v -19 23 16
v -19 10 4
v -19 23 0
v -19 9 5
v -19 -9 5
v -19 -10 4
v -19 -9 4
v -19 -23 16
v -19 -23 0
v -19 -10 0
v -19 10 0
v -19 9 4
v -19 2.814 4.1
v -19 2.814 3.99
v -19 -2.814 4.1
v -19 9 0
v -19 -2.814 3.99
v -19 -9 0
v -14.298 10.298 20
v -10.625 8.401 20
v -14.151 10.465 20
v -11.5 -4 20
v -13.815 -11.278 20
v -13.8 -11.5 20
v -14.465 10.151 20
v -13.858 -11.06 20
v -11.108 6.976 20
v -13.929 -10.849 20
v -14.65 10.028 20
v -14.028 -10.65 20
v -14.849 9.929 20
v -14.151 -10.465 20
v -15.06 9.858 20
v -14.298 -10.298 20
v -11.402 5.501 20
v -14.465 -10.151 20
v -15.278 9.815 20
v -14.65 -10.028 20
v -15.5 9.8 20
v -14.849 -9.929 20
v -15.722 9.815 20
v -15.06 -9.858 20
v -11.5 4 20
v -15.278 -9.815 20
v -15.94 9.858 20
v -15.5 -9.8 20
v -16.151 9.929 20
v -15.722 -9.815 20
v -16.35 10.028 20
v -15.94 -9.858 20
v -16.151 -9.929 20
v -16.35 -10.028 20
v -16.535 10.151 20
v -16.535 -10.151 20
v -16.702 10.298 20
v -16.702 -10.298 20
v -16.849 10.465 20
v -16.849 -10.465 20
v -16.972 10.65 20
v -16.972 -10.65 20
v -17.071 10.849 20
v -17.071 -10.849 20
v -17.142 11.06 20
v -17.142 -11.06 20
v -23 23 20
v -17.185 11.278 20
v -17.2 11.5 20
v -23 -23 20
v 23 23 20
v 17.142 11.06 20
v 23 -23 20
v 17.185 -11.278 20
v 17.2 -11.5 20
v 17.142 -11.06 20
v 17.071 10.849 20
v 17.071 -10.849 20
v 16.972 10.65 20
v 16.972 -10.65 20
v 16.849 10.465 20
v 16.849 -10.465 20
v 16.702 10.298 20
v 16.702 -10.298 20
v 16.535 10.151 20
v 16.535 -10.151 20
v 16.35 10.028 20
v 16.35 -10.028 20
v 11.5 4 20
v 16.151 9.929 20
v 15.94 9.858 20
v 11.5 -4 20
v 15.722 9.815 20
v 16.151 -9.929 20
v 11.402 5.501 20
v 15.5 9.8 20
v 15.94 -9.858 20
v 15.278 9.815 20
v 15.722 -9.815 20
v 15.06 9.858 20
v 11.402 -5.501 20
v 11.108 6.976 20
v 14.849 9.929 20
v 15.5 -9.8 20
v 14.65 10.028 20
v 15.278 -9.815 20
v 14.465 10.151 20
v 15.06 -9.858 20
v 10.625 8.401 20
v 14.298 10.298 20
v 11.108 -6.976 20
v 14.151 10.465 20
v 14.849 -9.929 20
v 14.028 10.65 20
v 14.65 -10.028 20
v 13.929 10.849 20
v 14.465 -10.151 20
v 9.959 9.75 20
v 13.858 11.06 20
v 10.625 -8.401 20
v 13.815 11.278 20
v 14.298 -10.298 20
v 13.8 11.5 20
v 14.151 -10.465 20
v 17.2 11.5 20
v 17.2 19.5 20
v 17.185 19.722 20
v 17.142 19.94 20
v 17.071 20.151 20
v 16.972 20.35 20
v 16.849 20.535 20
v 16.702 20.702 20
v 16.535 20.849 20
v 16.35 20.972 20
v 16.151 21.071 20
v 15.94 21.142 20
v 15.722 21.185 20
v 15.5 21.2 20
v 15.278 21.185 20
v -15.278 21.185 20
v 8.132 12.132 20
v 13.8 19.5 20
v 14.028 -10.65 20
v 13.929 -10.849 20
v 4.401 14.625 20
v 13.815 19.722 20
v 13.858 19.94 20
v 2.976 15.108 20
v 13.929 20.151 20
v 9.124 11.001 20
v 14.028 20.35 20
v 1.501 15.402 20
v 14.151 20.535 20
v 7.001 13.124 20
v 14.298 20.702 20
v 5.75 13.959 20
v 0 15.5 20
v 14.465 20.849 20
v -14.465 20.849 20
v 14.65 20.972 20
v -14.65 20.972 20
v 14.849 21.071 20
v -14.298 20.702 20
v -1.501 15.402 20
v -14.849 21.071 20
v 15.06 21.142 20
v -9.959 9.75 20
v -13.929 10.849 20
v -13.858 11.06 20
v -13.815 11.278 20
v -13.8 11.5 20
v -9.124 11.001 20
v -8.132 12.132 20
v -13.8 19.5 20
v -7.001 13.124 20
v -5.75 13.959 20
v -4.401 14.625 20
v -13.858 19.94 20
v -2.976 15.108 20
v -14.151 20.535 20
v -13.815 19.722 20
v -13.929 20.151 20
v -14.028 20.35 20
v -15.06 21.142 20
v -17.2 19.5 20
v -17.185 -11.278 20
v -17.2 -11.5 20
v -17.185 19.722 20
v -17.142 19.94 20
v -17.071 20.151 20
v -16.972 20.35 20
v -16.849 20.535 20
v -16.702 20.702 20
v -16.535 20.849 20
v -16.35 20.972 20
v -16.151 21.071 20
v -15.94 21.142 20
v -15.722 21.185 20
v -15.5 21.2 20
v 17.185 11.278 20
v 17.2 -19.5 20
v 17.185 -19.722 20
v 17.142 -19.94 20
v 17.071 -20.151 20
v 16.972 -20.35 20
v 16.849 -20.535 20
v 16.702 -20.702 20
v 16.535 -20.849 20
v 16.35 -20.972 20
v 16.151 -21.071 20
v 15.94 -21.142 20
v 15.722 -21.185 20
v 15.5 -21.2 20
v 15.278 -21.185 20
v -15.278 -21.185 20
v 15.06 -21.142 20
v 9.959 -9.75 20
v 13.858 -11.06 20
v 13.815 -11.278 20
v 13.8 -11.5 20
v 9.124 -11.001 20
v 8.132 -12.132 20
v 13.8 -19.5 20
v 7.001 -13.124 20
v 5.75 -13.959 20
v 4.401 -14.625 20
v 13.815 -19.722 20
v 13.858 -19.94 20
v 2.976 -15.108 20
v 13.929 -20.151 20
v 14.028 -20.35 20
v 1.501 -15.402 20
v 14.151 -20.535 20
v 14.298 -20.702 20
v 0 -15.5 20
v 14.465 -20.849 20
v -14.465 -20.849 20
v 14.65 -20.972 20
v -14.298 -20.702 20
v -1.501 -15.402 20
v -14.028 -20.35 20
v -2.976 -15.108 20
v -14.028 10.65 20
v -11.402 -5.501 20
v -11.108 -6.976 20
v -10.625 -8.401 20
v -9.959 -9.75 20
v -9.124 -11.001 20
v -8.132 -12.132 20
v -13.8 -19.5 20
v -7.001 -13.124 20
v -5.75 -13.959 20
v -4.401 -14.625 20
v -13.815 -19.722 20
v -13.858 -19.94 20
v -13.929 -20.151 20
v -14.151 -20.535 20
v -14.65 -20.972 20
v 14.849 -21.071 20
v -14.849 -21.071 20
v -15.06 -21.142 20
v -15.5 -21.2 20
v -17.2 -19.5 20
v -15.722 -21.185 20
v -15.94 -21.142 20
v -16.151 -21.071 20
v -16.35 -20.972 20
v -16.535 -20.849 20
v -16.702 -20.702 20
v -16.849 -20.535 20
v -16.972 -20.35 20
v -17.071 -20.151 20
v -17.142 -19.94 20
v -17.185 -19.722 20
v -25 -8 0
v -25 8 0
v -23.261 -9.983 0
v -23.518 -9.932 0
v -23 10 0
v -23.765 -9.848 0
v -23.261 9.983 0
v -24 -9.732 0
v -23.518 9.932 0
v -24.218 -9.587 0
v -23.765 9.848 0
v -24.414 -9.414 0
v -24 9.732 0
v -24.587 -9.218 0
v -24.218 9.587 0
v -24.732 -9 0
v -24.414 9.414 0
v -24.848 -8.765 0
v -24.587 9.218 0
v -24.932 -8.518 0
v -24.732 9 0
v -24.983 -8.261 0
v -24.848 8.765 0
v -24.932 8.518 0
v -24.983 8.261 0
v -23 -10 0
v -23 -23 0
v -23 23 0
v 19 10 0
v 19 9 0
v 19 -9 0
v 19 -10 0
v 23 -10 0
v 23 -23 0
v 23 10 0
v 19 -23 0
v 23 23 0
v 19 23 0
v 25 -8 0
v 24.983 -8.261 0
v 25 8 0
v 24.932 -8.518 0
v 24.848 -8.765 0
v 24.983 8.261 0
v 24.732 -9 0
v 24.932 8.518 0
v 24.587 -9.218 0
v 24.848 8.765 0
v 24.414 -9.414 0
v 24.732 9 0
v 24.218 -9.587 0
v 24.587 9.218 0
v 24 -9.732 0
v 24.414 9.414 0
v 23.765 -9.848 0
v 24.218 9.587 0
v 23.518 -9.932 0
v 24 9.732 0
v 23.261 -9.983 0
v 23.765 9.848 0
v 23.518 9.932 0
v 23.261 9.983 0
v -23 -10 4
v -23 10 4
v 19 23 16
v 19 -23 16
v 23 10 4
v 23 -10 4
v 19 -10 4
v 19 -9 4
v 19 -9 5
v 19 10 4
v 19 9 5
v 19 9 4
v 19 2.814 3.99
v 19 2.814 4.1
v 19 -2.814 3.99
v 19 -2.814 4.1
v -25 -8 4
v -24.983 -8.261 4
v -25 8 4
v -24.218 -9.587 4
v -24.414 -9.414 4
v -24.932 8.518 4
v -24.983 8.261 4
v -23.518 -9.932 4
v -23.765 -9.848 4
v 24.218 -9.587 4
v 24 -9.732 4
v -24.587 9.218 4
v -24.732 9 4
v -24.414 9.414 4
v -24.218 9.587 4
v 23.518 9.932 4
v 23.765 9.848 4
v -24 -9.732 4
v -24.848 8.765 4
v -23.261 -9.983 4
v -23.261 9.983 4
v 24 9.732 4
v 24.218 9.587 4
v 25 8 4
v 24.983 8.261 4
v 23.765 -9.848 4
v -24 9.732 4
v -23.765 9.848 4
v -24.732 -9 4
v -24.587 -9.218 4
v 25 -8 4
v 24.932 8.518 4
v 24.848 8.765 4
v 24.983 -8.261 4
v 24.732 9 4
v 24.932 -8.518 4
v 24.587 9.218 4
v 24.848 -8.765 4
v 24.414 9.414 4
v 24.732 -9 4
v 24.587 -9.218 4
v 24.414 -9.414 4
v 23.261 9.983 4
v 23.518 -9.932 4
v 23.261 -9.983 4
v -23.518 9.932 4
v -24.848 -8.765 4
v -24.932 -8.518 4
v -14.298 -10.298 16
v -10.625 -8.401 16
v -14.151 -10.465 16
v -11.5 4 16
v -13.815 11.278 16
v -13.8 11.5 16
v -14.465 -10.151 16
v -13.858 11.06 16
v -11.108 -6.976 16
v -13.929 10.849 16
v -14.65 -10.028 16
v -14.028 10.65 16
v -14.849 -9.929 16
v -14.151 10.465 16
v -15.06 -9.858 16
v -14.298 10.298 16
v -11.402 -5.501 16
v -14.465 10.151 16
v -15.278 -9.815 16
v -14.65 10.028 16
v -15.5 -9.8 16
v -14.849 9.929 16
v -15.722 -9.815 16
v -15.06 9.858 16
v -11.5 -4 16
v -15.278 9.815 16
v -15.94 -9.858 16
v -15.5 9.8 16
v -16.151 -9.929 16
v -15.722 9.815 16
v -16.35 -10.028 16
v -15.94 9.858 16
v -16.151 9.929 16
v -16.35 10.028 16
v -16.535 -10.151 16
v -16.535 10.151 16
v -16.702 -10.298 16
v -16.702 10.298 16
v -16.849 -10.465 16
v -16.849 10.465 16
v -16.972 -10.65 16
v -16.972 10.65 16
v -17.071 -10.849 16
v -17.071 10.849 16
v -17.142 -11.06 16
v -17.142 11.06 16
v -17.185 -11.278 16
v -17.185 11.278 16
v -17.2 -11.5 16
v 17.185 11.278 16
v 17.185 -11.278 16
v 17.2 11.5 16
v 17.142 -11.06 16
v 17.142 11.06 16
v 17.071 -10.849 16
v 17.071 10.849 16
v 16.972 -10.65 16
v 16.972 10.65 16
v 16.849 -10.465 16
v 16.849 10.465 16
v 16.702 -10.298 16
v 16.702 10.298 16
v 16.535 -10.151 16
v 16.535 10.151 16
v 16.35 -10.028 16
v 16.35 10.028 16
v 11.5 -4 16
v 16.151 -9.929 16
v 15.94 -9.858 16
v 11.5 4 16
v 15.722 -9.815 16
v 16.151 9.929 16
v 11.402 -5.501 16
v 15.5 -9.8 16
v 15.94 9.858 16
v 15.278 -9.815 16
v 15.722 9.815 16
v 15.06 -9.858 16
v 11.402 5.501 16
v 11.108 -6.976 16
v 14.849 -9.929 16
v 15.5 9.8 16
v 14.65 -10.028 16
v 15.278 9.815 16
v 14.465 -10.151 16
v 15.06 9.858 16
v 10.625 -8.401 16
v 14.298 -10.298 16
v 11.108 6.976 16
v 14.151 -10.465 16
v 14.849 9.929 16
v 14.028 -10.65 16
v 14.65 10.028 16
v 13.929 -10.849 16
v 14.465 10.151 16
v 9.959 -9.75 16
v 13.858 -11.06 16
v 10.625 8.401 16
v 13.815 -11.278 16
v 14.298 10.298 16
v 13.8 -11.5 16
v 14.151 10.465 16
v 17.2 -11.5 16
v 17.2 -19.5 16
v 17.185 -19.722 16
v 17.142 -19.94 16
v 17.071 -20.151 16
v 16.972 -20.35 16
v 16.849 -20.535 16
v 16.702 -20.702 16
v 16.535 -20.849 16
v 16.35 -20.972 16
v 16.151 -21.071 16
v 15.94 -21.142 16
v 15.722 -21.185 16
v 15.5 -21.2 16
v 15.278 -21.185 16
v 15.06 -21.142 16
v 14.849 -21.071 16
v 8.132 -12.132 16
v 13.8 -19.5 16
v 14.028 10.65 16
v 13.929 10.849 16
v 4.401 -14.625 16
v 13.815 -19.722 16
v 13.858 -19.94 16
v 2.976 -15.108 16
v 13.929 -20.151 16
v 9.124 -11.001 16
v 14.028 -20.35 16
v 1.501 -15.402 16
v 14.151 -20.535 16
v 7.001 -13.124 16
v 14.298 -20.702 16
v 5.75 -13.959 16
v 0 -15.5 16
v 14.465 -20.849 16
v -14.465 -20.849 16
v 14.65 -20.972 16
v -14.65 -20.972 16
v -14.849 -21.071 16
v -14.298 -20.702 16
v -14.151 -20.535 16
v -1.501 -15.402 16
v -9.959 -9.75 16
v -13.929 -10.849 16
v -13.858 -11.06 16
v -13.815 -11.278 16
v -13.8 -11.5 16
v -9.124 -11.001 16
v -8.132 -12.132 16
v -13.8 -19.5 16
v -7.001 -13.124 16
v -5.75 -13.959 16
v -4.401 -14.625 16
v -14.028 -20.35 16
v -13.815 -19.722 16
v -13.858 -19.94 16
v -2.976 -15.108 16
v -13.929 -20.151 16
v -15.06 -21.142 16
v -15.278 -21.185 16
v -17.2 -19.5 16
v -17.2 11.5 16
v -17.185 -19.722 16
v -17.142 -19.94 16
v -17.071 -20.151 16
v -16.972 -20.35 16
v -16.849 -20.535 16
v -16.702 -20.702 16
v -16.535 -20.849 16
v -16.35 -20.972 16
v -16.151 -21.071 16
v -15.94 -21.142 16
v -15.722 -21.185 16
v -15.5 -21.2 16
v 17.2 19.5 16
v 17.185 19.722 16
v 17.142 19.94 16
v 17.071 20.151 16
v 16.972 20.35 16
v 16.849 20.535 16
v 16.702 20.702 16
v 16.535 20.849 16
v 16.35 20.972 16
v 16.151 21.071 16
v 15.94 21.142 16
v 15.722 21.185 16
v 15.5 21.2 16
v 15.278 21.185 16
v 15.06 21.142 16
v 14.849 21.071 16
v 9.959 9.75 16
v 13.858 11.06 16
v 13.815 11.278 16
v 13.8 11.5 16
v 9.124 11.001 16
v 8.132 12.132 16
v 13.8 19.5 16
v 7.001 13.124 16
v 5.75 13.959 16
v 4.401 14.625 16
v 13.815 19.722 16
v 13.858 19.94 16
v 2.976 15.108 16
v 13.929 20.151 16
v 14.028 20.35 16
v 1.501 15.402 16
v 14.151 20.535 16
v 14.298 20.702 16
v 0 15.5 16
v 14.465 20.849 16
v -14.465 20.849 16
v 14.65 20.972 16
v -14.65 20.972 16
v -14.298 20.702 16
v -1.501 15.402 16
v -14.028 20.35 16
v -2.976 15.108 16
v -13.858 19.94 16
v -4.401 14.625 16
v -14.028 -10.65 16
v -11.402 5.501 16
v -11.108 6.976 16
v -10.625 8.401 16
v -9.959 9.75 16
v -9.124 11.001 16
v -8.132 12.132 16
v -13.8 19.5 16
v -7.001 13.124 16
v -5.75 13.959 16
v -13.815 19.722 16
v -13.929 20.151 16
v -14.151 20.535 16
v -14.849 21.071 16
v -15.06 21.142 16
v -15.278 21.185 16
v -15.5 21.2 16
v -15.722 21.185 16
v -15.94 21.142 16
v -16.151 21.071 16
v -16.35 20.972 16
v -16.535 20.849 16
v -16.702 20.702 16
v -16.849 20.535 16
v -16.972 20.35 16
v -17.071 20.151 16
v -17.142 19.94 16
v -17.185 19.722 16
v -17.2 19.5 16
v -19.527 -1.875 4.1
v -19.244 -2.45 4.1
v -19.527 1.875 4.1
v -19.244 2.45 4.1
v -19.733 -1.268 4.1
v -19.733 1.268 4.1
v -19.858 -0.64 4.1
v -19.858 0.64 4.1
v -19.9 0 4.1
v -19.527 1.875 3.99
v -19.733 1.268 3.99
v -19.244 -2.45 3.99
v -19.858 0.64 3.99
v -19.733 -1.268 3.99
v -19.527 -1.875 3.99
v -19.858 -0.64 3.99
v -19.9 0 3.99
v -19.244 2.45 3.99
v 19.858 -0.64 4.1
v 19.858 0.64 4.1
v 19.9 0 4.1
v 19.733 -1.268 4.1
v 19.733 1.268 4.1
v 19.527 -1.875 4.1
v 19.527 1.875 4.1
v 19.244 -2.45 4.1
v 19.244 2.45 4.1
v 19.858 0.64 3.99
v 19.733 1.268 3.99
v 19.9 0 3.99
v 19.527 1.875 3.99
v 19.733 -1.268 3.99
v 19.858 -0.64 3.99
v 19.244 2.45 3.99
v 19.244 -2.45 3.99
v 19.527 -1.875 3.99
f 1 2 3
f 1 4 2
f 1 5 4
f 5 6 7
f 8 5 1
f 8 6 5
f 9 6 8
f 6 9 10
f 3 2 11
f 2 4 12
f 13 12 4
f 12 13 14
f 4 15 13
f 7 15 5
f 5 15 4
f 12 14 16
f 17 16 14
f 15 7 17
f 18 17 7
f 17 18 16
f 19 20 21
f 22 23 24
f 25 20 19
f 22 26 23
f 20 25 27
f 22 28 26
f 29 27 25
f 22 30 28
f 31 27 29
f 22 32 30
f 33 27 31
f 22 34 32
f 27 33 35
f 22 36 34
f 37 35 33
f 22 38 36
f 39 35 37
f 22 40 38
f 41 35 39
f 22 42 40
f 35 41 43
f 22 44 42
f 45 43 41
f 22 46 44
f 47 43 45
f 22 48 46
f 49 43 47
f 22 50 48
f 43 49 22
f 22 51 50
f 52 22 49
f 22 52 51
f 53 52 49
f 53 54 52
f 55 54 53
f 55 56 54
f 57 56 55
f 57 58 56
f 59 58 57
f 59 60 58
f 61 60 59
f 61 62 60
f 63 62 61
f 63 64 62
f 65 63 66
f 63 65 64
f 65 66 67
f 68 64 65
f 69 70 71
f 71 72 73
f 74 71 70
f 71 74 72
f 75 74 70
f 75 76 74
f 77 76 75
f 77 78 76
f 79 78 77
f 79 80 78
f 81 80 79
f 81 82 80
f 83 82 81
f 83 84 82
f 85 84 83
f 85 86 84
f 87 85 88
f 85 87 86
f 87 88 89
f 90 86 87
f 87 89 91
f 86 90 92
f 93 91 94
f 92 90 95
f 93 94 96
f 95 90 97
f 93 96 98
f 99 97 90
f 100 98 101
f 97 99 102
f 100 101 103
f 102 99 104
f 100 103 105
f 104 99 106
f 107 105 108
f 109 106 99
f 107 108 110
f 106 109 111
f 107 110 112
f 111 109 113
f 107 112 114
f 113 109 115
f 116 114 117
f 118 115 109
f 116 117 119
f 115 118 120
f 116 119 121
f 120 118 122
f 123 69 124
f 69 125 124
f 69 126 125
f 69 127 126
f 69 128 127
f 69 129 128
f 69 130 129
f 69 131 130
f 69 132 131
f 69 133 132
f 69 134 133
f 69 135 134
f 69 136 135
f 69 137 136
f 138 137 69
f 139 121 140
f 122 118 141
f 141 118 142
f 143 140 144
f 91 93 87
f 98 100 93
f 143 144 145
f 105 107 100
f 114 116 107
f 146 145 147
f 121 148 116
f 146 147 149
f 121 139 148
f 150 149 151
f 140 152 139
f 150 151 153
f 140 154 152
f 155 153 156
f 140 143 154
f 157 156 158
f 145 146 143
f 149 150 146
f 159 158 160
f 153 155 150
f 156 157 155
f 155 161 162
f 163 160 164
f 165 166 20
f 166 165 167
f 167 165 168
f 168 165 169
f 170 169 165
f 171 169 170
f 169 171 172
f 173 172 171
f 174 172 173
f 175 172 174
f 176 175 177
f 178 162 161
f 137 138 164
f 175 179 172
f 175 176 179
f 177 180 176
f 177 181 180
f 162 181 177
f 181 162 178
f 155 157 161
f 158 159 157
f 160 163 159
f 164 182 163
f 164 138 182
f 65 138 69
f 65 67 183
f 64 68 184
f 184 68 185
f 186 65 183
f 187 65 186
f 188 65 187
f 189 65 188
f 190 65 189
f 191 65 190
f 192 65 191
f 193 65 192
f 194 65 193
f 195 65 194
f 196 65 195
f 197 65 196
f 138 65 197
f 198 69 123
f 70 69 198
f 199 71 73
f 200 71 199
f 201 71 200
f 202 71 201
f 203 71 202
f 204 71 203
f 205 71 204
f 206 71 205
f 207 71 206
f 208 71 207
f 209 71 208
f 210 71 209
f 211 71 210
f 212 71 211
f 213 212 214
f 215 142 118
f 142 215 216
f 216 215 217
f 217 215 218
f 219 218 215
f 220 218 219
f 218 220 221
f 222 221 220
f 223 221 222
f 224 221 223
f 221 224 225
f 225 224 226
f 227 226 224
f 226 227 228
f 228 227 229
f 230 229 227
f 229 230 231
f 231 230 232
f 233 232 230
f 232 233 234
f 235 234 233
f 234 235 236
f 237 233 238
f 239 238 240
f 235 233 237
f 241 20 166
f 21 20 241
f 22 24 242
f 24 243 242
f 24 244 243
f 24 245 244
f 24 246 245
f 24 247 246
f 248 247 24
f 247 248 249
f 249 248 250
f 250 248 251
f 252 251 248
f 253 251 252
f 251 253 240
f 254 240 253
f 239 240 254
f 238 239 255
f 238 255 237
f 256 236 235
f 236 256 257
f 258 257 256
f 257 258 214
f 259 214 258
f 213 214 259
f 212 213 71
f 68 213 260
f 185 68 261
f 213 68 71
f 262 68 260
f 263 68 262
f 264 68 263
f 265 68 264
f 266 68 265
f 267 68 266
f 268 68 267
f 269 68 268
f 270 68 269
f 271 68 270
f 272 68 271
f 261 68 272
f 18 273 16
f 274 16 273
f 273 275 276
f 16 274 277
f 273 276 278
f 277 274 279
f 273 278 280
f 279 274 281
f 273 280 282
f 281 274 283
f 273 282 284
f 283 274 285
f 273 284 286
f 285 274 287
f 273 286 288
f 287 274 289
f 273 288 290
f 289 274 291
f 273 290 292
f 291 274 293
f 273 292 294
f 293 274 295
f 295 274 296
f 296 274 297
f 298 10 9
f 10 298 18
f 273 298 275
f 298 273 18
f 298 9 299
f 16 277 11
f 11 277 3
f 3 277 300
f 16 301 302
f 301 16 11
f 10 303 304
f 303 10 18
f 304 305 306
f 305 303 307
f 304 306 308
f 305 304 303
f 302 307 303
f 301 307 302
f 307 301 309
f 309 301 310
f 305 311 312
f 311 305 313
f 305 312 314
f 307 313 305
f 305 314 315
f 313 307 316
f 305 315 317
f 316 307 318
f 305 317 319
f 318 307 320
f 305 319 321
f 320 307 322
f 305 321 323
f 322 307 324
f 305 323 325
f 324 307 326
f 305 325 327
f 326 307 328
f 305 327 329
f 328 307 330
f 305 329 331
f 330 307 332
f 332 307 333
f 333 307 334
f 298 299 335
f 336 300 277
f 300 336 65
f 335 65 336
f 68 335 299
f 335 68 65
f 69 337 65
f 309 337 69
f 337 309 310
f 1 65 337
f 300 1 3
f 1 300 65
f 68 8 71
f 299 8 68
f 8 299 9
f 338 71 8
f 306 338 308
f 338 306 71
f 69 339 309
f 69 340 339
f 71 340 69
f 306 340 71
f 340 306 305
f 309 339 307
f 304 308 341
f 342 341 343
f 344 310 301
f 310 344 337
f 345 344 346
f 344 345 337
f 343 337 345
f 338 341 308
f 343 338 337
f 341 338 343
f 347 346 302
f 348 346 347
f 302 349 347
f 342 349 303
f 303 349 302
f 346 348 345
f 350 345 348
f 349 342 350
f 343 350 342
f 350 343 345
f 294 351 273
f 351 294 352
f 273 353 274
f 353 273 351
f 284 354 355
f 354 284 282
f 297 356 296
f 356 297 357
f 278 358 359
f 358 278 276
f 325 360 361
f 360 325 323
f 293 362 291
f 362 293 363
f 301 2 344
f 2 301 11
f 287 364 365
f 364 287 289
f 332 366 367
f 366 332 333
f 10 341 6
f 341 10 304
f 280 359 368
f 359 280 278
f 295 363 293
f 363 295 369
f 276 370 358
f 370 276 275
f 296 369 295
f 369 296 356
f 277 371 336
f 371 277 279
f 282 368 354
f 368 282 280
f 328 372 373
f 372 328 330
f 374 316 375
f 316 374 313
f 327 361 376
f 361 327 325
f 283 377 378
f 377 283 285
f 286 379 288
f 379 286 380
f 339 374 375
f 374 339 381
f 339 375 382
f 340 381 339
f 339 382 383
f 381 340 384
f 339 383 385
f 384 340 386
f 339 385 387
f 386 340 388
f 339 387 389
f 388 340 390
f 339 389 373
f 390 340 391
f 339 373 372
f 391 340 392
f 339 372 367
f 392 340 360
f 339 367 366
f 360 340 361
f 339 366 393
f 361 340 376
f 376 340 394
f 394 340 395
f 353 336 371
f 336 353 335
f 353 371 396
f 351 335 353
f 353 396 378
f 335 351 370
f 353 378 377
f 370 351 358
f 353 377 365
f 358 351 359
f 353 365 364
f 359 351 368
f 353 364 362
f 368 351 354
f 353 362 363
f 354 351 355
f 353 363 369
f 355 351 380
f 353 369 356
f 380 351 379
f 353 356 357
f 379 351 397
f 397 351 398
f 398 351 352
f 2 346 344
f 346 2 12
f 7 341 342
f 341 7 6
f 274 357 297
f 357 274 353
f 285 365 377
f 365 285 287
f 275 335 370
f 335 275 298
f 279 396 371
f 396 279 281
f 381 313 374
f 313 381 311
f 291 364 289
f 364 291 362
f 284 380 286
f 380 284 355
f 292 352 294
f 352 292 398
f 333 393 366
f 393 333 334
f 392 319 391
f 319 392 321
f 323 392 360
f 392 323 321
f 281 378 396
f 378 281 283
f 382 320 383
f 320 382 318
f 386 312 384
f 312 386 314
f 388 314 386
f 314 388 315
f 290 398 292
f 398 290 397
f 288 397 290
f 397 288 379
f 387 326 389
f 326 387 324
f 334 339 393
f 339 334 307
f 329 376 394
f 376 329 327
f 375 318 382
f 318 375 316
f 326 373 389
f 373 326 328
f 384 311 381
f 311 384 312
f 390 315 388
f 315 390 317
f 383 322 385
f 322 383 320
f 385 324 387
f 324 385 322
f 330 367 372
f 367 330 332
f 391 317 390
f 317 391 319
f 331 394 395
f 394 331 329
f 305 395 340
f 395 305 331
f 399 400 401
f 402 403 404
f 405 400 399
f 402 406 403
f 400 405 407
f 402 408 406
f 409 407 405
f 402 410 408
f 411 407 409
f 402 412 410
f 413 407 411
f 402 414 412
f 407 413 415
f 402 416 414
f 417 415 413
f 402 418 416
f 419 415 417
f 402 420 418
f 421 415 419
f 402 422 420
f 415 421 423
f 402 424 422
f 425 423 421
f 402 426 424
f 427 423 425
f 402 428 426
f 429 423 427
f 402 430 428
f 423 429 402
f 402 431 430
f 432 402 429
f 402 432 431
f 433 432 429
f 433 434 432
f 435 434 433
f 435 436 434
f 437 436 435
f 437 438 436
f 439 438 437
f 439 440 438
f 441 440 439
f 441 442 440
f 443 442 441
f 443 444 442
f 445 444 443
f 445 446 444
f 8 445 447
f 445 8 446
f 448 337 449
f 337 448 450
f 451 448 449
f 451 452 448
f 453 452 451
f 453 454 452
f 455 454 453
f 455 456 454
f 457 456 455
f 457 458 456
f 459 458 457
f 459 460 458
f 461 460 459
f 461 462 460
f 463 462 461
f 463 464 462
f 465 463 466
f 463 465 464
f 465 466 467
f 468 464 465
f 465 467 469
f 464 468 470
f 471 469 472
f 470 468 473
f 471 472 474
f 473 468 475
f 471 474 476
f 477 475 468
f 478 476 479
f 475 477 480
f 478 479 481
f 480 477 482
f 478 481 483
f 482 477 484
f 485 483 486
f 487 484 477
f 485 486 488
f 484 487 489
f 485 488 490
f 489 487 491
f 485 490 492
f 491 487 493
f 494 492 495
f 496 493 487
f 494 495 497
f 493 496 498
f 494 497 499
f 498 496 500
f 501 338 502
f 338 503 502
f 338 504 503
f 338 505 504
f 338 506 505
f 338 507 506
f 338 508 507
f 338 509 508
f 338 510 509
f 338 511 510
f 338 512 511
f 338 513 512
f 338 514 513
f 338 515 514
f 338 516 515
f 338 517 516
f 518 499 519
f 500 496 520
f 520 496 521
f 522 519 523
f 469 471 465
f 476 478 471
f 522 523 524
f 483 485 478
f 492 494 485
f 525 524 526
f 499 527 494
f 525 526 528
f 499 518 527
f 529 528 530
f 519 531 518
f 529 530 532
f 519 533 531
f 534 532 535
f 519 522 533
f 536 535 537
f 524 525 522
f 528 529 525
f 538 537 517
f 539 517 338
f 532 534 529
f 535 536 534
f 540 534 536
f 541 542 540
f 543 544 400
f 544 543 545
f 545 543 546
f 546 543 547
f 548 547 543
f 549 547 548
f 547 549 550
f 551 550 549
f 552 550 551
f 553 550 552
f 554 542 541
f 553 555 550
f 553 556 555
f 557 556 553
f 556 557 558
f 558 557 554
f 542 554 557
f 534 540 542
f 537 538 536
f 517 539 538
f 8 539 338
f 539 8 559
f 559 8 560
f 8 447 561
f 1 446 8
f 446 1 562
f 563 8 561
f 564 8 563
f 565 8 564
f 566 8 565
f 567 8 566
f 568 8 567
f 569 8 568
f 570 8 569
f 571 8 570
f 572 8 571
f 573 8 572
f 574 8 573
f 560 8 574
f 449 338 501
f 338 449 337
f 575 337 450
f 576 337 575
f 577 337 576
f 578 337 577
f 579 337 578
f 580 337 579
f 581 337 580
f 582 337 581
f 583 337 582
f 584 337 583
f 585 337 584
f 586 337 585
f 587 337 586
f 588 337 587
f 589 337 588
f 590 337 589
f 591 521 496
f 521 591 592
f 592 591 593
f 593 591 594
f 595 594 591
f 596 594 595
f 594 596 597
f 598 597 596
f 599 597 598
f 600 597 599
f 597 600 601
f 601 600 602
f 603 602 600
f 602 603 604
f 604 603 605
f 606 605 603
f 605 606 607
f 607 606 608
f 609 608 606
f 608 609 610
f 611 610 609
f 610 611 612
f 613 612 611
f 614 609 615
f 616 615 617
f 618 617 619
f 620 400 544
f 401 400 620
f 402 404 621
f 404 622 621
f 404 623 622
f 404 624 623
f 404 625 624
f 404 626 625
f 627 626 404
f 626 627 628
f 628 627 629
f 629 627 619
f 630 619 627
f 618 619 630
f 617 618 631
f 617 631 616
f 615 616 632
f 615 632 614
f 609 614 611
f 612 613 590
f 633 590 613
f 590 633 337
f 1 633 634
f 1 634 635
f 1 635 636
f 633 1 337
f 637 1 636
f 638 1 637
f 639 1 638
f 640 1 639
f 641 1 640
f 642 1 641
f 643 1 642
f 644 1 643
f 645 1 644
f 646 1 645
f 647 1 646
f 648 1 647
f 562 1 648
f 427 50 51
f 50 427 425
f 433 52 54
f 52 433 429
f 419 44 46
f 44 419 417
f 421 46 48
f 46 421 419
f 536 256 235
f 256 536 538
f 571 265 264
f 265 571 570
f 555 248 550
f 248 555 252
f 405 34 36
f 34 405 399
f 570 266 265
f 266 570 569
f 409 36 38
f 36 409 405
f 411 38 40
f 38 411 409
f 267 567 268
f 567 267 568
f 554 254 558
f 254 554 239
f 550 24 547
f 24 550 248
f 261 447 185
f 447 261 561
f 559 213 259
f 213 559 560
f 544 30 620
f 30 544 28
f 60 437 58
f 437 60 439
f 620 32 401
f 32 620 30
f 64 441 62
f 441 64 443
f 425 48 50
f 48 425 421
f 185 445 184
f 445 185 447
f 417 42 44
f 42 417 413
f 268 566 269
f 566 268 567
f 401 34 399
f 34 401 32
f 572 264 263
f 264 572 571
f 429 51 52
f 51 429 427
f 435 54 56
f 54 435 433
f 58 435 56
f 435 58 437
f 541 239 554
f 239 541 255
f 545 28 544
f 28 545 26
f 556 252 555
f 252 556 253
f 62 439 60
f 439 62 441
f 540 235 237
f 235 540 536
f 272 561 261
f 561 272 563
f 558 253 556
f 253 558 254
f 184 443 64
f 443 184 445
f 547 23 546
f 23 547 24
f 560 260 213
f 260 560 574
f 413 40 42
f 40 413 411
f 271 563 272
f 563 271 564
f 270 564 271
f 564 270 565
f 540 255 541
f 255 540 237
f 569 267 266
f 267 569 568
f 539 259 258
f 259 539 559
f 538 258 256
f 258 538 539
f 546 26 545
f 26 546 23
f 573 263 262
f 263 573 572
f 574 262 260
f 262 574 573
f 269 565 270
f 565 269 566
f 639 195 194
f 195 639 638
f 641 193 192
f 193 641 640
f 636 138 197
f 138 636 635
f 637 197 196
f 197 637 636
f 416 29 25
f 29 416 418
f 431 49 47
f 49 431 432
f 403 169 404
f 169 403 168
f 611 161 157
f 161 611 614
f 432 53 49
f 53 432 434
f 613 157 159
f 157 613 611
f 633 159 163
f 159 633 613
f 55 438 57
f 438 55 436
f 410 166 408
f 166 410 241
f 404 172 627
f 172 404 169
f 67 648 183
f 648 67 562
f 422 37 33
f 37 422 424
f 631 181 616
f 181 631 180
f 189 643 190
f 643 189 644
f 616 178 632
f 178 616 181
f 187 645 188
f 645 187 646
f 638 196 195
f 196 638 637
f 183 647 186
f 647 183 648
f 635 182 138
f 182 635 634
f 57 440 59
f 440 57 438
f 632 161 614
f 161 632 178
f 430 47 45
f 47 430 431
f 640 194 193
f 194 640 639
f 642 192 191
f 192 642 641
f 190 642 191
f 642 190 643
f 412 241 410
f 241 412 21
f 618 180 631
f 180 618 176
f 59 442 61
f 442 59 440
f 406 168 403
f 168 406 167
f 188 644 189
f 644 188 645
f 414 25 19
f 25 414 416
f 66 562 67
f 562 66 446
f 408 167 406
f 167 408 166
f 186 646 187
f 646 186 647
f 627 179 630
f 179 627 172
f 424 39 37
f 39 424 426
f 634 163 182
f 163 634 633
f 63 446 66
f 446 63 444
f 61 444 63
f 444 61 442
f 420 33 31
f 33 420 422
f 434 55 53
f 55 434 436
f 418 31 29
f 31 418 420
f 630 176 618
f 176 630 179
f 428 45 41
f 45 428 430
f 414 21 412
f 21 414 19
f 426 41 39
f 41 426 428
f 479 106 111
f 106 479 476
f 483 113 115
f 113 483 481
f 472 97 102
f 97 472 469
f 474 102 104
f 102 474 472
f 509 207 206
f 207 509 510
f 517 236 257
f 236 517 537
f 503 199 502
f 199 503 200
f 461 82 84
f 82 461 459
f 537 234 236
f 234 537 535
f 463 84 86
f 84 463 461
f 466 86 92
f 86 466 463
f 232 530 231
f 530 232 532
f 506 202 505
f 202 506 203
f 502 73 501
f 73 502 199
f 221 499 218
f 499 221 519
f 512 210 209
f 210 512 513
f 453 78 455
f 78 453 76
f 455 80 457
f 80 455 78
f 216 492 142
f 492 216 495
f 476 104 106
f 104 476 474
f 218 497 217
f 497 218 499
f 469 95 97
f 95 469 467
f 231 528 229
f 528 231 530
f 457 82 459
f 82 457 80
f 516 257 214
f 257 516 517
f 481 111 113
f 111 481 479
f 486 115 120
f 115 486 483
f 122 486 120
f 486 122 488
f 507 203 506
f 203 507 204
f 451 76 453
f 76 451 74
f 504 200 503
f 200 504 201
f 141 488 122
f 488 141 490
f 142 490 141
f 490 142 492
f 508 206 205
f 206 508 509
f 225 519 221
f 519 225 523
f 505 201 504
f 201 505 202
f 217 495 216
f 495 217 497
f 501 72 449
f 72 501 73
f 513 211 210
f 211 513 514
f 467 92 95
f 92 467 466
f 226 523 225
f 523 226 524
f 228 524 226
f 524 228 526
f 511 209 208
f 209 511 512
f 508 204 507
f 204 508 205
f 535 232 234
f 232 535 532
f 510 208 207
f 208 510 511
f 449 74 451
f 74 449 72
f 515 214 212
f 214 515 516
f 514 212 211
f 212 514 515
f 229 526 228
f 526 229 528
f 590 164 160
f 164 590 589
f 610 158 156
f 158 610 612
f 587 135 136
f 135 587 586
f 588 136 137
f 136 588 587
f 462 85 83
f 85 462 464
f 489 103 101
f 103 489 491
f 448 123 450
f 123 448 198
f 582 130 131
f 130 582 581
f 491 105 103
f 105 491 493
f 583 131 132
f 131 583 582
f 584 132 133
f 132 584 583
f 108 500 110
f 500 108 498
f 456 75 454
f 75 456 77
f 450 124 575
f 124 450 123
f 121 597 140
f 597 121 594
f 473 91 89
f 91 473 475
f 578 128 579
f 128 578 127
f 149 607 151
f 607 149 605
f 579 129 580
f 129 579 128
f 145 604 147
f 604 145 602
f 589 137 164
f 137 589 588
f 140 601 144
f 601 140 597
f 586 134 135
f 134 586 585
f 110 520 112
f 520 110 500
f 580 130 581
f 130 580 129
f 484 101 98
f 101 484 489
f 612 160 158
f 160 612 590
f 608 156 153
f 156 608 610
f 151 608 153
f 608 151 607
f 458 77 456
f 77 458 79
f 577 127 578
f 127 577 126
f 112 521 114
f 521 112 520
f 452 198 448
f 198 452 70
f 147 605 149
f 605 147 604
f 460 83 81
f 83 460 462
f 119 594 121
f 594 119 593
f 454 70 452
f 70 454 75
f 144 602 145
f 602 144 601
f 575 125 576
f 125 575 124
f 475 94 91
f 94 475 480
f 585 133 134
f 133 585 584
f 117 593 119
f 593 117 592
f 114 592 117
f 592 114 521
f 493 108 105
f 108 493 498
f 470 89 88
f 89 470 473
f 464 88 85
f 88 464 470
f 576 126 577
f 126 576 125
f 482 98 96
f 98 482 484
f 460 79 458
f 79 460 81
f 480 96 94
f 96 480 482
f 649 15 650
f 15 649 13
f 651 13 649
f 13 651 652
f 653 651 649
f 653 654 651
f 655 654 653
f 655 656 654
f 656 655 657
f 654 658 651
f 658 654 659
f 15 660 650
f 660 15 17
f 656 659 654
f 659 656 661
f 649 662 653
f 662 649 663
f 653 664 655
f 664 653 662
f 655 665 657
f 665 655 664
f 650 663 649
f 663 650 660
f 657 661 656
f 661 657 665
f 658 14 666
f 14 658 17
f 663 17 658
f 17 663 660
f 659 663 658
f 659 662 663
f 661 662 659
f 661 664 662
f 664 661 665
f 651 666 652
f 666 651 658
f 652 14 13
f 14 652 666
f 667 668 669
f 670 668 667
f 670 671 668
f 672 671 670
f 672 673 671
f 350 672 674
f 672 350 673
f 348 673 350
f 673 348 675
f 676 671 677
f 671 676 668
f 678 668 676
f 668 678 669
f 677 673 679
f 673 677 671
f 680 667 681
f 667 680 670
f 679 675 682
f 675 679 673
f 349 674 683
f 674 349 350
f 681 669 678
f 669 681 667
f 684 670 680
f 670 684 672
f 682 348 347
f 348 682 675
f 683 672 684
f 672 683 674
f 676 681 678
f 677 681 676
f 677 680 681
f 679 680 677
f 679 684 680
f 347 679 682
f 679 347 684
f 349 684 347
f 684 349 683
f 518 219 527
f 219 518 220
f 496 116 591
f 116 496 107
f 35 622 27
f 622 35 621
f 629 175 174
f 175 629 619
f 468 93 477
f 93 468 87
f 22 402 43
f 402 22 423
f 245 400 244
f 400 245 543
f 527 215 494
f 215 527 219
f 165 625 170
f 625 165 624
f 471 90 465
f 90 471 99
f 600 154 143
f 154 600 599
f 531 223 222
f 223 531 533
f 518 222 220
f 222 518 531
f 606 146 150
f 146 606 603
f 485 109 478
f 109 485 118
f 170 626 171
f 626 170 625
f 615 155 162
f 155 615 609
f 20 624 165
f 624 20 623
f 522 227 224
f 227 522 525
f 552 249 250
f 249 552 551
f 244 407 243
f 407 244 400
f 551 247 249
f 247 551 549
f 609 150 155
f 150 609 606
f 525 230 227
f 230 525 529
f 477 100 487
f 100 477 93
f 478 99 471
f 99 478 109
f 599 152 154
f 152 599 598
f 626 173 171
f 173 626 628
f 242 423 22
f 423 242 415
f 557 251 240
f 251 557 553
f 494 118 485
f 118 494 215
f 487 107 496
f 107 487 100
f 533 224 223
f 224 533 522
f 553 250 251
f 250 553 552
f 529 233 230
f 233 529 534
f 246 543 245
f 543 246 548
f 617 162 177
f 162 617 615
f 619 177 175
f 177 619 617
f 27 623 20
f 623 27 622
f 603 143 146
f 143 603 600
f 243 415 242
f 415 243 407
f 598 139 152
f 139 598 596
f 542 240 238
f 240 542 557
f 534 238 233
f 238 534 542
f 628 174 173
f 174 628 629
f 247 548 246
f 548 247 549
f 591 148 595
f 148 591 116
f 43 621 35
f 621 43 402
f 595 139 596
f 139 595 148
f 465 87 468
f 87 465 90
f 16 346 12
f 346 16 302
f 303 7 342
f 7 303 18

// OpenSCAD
// file: lib/comun.scad
// =====================================================================
// AutoSwapEnder3Pro - parametros y utilidades comunes de las piezas
// Licencia MIT. Unidades: milimetros.
//
// Sistema de coordenadas de la ESTACION (el mismo en todas las piezas que
// se montan en ella):
//   s : a lo largo de la estacion, 0 = HOME del carro, crece hacia la impresora
//   x : a lo ancho, 0 = eje central (riel lineal), +x = lado de la caja de descarga
//   z : vertical, 0 = cara superior de la base de perfiles 2020 ("b" en la guia)
// El plano de transferencia (superficie por la que se deslizan las placas)
// esta en z = PLANO. Se ajusta a la altura de la cama de la impresora con las
// patas niveladoras, NO cambiando estas piezas.
// =====================================================================

$fn = 48;

// ----------------------------------------------------- placas y cama
placa_ancho  = 235;     // placa PEI
placa_largo  = 235;
placa_esp    = 0.6;     // espesor real de tus placas (mide con calibrador; 0.5 a 0.75)
voladizo     = 11;      // cuanto sobresale la placa (o su lengüeta) por delante de la cama

// ----------------------------------------------------- estacion (alturas sobre la base)
PLANO        = 60;      // plano de transferencia sobre la cara superior de la base
RIEL_SUP     = 20;      // cara superior del riel lineal (2020 apoyado en los travesaños)
ZP           = PLANO - RIEL_SUP;  // = 40: plano de transferencia sobre el riel lineal

// zapata (debe coincidir con zapata.scad)
zapata_bajo  = 8;       // cuanto cuelga la zapata por debajo de la placa
zapata_bolsillo = 6;    // profundidad del bolsillo para el dedo (desde abajo)

// cargador (ascensor)
paso_estante = 14;      // distancia vertical entre placas en el cargador
niveles      = 6;       // placas que caben en el cargador

// ----------------------------------------------------- perfil y tornilleria
perfil      = 20;       // perfil de aluminio 2020
ranura_ancho = 6.2;     // boca de la ranura (serie 20)
holgura     = 0.3;      // holgura general de impresion

m2_paso     = 1.8;   // agujero para autorroscante M2 (servos)
m3          = 3.4;   // paso libre M3
m3_rosca    = 2.7;   // para roscar M3 directamente en plastico
m3_tuerca   = 5.7;   // M3: entre caras + holgura
m3_tuerca_h = 2.6;
m3_cabeza   = 6.2;
m4          = 4.4;
m5          = 5.4;   // paso libre M5
m5_cabeza   = 9.2;
m5_tuerca   = 8.2;   // M5: entre caras + holgura

// ruedas en V estandar (Openbuilds "Solid V Wheel" + rodamientos 625)
rueda_d      = 23.9;
rueda_ancho  = 10.2;
rueda_sep    = 39.26;   // distancia entre centros de ruedas a ambos lados de un 2020
excentrica_d = 7.2;     // alojamiento del espaciador excentrico
espaciador_h = 6;       // espaciador (excentrico o fijo) entre rueda y placa

// ----------------------------------------------------- utilidades

// Caja con aristas verticales redondeadas (r) apoyada en z=0.
module caja_r(size, r = 2) {
  r2 = min(r, size[0] / 2 - 0.01, size[1] / 2 - 0.01);
  hull() for (ix = [r2, size[0] - r2], iy = [r2, size[1] - r2])
    translate([ix, iy, 0]) cylinder(r = r2, h = size[2]);
}

// Igual pero centrada en x e y.
module caja_rc(size, r = 2) { translate([-size[0] / 2, -size[1] / 2, 0]) caja_r(size, r); }

// Prisma hexagonal para tuercas (ec = medida entre caras).
module hexagono(ec, h) { cylinder(d = ec / cos(30), h = h, $fn = 6); }

// Ranura (agujero alargado) a lo largo de x.
module ranura(largo, d, h) {
  hull() for (i = [-largo / 2, largo / 2]) translate([i, 0, 0]) cylinder(d = d, h = h);
}

// Taladro M5 con avellanado para la cabeza (para atornillar a un perfil con tuerca en T).
module taladro_m5(h, cabeza = 4) {
  translate([0, 0, -0.1]) cylinder(d = m5, h = h + 0.2);
  translate([0, 0, h - cabeza]) cylinder(d = m5_cabeza + 0.6, h = cabeza + 0.1);
}

// Taladro M3 pasante con alojamiento de tuerca hexagonal por debajo.
module taladro_m3_tuerca(h, prof_tuerca = m3_tuerca_h + 0.2) {
  translate([0, 0, -0.1]) cylinder(d = m3, h = h + 0.2);
  translate([0, 0, -0.1]) hexagono(m3_tuerca, prof_tuerca + 0.1);
}

// Perfil 2020 de referencia (solo para ensamble y comprobaciones visuales).
module perfil2020(largo) {
  difference() {
    translate([-10, -10, 0]) cube([20, 20, largo]);
    for (a = [0, 90, 180, 270]) rotate([0, 0, a])
      translate([10 - 1.8, -ranura_ancho / 2, -1]) cube([2, ranura_ancho, largo + 2]);
    translate([0, 0, -1]) cylinder(d = 4.2, h = largo + 2);
  }
}

// Microinterruptor KW11-3Z con palanca de rodillo (referencia: 20 x 6.4 x 10 mm,
// taladros M2 a 9.5 mm). Agujeros de montaje, con la cara de montaje en z=0.
module taladros_kw11(h = 10) {
  for (i = [-4.75, 4.75]) translate([i, 0, -0.1]) cylinder(d = 2.2, h = h + 0.2);
}
// main file
// =====================================================================
// SOPORTES DEL EJE LINEAL (motor y polea loca) - lazo de correa lateral
// Material: PETG. 4 perimetros, 30 %. Imprimir como sale el STL.
//   pieza = "motor" : soporte del NEMA 17 (boca abajo, eje hacia abajo) sobre el
//                     travesaño HOME. Agujeros ranurados: deslizando el motor se
//                     tensa la correa.
//   pieza = "polea" : soporte de la polea loca GT2 20T (eje M3 vertical) sobre el
//                     travesaño del lado de la impresora.
// El lazo de correa es horizontal y va a un lado del riel (centro en x = -48),
// a 6-12 mm sobre la base (14-8 mm por debajo de la cara superior del riel).
// Coordenadas locales: origen en el centro de la polea, z = 0 en la cara
// superior del travesaño.
// =====================================================================
include <lib/comun.scad>

pieza = "motor";  // "motor" | "polea"

banda = [6, 12];   // banda de la correa sobre la base
tension = 4;       // recorrido de tension (+-) del motor

module soporte_motor() {
  w = 46;        // ancho de la placa del motor
  h_placa = 16;  // cara inferior de la placa del motor (el motor apoya encima)
  e = 4;
  difference() {
    union() {
      // pie sobre el travesaño (20 mm de ancho en s)
      translate([-w / 2 - 2, -10, 0]) caja_r([w + 4, 20, e], 2);
      // paredes laterales
      for (sx = [-1, 1]) translate([sx > 0 ? w / 2 - e : -w / 2, -w / 2, 0]) cube([e, w, h_placa + e]);
      // placa del motor
      translate([-w / 2, -w / 2, h_placa]) caja_r([w, w, e], 3);
    }
    // paso de la polea y del eje (ranurado para tensar)
    translate([0, 0, h_placa - 1]) hull() for (dy = [-tension, tension]) translate([0, dy, 0]) cylinder(d = 23, h = e + 2);
    // tornillos M3 del motor (31 mm), ranurados en s
    for (sx = [-15.5, 15.5], sy = [-15.5, 15.5]) translate([sx, sy, h_placa - 1])
      hull() for (dy = [-tension, tension]) translate([0, dy, 0]) cylinder(d = m3, h = e + 2);
    // tornillos M5 al travesaño
    for (sx = [-15, 15]) translate([sx, 0, 0]) taladro_m5(e, 0.01);
    // hueco central del pie (la polea baja hasta z = 5)
    translate([-w / 2 + e, -9, -1]) cube([w - 2 * e, 18, e + 2]);
  }
}

module soporte_polea() {
  e = 3.5;
  ancho = 26;
  difference() {
    union() {
      // pie (sobre el travesaño)
      translate([-ancho / 2, -6, 0]) caja_r([ancho, 20, e], 2);
      // pared trasera (lado impresora)
      translate([-ancho / 2, 10, 0]) cube([ancho, e, banda[1] + 6.5]);
      // placa superior en voladizo sobre la polea
      translate([-ancho / 2, -11, banda[1] + 3]) caja_r([ancho, 11 + 10 + e, e], 2);
      // placa inferior bajo la polea
      translate([-ancho / 2, -11, 0]) caja_r([ancho, 17, e], 2);
    }
    // eje M3 de la polea
    translate([0, 0, -1]) cylinder(d = m3, h = 40);
    translate([0, 0, -0.1]) rotate([0, 0, 30]) hexagono(m3_tuerca, m3_tuerca_h + 0.1);
    // tornillos M5 al travesaño (ranurados en x para alinear con el motor)
    for (sx = [-1, 1]) translate([sx * 8, 6, -0.1]) hull() for (dx = [-2, 2]) translate([dx, 0, 0])
      cylinder(d = m5, h = e + 0.2);
  }
}

if (pieza == "motor") soporte_motor();
else soporte_polea();
